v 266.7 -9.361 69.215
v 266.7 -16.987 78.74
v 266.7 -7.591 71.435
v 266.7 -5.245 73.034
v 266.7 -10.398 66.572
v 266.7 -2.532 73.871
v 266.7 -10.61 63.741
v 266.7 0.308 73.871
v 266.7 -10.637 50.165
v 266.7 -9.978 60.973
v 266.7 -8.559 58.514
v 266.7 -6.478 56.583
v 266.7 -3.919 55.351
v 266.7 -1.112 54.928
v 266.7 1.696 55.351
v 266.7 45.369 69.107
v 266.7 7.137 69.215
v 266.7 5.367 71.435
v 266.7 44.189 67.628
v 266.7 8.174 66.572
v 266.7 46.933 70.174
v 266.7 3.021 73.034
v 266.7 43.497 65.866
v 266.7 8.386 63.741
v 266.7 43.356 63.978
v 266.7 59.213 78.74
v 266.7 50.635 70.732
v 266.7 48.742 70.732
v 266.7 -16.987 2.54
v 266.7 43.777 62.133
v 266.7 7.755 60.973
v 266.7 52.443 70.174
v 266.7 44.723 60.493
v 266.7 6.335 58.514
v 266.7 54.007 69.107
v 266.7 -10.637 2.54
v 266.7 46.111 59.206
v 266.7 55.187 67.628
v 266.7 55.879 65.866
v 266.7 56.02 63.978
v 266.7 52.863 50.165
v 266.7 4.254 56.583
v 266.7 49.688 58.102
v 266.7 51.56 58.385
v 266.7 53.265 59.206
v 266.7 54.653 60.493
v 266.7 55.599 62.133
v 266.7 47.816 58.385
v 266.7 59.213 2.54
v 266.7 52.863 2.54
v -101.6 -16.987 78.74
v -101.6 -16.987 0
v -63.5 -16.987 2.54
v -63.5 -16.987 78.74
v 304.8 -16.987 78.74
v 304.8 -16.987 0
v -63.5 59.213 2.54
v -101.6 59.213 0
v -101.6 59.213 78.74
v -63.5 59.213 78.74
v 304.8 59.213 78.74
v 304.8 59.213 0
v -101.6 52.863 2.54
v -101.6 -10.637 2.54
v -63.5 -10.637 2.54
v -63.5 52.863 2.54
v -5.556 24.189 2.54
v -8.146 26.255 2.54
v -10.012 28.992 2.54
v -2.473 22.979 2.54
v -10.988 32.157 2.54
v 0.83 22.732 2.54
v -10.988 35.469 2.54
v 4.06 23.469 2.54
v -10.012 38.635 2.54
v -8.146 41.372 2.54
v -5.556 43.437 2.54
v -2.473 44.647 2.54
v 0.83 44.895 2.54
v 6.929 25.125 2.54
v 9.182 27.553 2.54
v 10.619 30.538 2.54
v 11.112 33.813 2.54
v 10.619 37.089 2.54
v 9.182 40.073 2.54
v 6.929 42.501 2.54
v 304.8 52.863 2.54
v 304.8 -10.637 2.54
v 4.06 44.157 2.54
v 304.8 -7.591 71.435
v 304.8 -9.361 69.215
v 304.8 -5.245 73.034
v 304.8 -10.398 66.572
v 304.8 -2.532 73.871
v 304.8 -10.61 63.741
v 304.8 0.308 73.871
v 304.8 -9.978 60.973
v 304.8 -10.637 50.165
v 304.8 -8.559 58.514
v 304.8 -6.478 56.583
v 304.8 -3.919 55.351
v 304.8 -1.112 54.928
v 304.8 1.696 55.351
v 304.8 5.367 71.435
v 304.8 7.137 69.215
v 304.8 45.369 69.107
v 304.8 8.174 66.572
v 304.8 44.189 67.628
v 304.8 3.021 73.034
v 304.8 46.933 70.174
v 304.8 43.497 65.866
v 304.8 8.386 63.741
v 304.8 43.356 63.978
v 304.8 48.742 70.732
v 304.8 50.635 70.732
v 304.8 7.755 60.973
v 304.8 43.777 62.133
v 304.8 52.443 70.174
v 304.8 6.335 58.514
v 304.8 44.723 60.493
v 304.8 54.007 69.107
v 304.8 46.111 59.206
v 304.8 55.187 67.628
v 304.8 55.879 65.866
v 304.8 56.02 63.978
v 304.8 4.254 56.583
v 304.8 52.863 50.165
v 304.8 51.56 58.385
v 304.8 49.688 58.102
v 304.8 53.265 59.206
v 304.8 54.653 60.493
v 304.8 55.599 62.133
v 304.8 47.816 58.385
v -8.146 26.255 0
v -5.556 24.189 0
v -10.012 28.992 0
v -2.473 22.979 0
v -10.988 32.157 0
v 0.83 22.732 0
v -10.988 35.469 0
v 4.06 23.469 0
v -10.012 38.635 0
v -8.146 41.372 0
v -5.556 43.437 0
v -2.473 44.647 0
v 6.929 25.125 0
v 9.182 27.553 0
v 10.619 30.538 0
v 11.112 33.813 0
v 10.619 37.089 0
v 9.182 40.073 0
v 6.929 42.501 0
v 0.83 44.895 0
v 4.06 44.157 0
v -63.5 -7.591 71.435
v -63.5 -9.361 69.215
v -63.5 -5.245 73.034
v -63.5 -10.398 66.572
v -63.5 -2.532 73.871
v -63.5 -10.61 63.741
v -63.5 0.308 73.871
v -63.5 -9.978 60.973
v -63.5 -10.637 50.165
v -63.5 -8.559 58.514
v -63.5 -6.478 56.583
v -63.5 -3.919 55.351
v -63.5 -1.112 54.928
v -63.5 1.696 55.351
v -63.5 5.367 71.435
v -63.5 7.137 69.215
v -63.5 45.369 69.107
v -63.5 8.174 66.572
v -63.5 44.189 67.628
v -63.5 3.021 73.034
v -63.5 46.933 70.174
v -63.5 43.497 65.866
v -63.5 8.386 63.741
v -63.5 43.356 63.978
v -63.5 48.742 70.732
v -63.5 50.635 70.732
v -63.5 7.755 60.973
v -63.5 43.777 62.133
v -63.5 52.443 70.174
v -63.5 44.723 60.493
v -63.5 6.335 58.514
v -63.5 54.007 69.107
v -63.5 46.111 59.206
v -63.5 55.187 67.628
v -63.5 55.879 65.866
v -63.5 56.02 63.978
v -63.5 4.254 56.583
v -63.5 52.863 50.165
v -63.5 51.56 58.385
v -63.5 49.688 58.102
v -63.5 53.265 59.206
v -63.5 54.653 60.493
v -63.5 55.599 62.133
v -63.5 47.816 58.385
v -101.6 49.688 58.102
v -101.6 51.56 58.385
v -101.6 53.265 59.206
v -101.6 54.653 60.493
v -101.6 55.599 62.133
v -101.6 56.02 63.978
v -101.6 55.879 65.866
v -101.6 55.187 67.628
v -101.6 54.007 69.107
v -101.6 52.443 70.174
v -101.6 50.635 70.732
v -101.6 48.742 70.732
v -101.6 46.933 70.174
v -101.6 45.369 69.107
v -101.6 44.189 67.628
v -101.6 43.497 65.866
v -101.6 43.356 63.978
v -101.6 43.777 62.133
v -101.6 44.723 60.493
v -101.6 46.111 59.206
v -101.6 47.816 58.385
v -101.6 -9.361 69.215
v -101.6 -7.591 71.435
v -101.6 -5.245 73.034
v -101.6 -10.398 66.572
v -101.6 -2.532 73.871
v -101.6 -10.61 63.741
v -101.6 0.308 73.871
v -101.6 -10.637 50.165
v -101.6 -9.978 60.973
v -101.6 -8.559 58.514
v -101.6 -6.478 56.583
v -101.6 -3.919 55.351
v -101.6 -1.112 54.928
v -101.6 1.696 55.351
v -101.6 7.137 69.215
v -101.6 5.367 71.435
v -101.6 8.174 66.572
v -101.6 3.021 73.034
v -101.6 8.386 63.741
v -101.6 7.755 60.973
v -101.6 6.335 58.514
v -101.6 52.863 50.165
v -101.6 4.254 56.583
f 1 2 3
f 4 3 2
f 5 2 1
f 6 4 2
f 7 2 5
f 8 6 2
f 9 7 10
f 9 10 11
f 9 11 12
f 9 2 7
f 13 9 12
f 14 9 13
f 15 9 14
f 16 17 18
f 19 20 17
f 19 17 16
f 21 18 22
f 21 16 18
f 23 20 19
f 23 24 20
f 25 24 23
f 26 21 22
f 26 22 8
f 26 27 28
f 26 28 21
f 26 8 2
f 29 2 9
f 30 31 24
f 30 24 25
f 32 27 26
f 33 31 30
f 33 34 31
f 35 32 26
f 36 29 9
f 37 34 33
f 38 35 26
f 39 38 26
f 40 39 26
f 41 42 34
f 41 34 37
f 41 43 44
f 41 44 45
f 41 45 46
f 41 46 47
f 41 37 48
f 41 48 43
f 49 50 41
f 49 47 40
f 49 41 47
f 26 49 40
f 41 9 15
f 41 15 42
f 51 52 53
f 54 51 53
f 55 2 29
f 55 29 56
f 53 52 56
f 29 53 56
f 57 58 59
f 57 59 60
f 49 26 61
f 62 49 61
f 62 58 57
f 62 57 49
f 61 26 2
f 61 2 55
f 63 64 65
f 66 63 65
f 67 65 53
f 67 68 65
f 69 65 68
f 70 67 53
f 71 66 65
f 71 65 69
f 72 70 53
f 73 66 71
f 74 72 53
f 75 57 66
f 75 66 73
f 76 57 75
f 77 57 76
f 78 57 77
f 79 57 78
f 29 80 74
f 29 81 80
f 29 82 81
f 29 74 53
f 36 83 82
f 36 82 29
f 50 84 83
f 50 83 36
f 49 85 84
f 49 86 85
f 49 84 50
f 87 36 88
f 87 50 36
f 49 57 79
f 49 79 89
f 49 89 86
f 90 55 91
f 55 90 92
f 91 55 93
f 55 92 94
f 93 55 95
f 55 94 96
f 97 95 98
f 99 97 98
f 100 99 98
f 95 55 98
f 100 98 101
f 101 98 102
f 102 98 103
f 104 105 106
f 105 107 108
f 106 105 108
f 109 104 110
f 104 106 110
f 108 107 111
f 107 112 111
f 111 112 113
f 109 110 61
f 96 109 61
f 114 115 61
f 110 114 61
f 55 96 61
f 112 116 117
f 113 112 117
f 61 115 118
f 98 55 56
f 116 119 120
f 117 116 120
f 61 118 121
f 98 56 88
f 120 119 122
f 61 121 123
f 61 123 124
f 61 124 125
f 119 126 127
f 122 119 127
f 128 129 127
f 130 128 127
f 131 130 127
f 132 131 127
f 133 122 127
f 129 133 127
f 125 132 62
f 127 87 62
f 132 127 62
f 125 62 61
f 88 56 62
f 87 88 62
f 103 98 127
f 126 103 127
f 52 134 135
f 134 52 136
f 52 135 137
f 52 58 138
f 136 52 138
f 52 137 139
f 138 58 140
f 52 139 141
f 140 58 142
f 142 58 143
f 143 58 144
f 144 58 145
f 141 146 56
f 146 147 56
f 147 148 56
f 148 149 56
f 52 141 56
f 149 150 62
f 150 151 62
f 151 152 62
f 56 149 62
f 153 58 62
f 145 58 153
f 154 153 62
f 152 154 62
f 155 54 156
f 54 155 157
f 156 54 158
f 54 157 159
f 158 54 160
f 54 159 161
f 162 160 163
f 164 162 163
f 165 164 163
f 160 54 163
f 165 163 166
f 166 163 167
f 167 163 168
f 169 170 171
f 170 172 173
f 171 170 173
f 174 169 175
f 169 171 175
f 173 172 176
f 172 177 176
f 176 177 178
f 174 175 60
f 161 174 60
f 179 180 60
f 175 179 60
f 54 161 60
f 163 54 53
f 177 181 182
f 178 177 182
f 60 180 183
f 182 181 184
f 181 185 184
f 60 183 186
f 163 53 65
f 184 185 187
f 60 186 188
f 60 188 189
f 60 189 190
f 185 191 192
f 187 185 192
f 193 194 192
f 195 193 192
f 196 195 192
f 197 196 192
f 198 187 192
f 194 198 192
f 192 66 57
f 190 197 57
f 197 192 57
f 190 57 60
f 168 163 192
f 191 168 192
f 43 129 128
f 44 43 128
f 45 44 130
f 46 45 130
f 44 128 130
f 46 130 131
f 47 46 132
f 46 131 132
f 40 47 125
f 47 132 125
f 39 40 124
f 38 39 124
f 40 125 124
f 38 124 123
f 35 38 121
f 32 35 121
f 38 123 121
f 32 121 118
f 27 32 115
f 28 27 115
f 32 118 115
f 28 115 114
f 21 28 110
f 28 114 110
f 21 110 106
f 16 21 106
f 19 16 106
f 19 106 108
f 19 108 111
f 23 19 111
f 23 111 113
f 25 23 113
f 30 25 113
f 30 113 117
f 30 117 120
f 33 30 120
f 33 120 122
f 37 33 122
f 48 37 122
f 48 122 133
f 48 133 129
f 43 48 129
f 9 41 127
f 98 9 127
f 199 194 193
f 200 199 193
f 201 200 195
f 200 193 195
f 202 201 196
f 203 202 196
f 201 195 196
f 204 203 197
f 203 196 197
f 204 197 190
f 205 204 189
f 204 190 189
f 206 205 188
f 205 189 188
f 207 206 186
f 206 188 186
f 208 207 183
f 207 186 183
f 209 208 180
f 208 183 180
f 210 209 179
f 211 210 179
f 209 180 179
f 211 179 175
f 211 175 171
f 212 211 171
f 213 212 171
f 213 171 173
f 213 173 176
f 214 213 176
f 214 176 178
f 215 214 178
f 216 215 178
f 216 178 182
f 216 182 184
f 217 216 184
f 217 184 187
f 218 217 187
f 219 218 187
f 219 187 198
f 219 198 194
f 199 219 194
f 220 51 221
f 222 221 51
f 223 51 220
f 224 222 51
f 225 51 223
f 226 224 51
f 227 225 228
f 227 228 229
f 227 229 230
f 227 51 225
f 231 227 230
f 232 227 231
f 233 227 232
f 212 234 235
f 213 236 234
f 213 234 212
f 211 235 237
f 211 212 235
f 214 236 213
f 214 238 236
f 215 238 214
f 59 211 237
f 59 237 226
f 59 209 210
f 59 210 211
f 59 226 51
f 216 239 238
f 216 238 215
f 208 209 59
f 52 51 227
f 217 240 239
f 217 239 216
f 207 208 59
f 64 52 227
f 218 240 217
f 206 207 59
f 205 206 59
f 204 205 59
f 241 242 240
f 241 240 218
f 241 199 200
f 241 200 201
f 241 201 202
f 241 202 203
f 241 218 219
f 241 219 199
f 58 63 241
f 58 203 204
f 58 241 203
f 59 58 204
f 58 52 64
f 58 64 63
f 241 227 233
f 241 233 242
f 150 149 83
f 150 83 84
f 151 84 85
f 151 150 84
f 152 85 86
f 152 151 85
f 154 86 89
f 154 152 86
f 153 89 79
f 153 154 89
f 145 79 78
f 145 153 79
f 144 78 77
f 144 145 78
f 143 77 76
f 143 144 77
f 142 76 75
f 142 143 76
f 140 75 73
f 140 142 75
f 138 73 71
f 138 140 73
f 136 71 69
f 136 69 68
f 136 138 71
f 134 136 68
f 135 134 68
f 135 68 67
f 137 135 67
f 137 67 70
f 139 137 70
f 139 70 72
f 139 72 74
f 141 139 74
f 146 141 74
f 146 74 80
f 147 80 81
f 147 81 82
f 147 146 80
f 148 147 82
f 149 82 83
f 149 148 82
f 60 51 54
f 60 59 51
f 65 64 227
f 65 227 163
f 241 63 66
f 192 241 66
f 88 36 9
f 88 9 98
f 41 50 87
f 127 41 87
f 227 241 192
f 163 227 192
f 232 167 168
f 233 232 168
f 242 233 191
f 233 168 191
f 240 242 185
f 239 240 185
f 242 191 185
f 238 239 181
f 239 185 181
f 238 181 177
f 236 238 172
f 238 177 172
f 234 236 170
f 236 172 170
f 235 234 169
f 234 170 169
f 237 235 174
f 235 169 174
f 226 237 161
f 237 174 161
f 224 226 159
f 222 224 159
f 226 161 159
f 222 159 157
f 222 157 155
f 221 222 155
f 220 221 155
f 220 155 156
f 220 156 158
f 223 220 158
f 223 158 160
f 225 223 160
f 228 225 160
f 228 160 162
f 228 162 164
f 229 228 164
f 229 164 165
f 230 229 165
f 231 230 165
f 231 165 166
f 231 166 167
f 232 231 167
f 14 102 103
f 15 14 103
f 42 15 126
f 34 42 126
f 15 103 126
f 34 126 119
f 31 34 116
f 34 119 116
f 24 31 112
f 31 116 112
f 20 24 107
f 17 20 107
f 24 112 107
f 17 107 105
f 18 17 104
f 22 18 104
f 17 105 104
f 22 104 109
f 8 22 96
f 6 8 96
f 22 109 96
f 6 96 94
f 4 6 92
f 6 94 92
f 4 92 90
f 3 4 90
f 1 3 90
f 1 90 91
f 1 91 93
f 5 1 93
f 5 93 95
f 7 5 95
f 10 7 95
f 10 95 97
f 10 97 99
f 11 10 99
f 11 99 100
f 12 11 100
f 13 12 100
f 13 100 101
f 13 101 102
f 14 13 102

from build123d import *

# Parameters (mm, degrees)
SKETCH1_W           = 609.6
SKETCH1_H           = 76.2
SKETCH1_R           = 11.1125
BOSS_EXTRUDE1_DEPTH = 2.54
SKETCH2_W           = 38.1
SKETCH2_H           = 6.35
BOSS_EXTRUDE2_DEPTH = 76.2
SKETCH3_W           = 38.1
SKETCH3_H           = 76.2
BOSS_EXTRUDE3_DEPTH = 28.575
SKETCH4_R           = 6.35
SKETCH4_R_2         = 9.525
CUT_EXTRUDE1_DEPTH  = 610.6
SKETCH5_W           = 203.2
SKETCH5_H           = 76.2
CUT_EXTRUDE2_DEPTH  = 3.54


with BuildPart() as part:
    # Sketch1 → Boss-Extrude1 (new body)
    with BuildSketch(Plane.XY):
        with Locations((0, 21.113121982)):
            Rectangle(SKETCH1_W, SKETCH1_H)
        with Locations((0, 33.813121982)):
            Circle(SKETCH1_R, mode=Mode.SUBTRACT)
    extrude(amount=BOSS_EXTRUDE1_DEPTH)

    # Sketch2 → Boss-Extrude2 (add)
    with BuildSketch(Plane.XY.offset(2.54)):
        with Locations((-82.55, 56.038121982)):
            Rectangle(SKETCH2_W, SKETCH2_H)
        with Locations((-82.55, -13.811878018)):
            Rectangle(SKETCH2_W, SKETCH2_H)
        with Locations((285.75, 56.038121982)):
            Rectangle(SKETCH2_W, SKETCH2_H)
        with Locations((285.75, -13.811878018)):
            Rectangle(SKETCH2_W, SKETCH2_H)
    extrude(amount=BOSS_EXTRUDE2_DEPTH)

    # Sketch3 → Boss-Extrude3 (add)
    with BuildSketch(Plane.XY.offset(78.74)):
        with Locations((-82.55, 21.113121982)):
            Rectangle(SKETCH3_W, SKETCH3_H)
        with Locations((285.75, 21.113121982)):
            Rectangle(SKETCH3_W, SKETCH3_H)
    extrude(amount=-BOSS_EXTRUDE3_DEPTH)

    # Sketch4 → Cut-Extrude1 (cut, through all)
    with BuildSketch(Plane(origin=(304.8, 0, 0), x_dir=(0, 0, -1), z_dir=(1, 0, 0))):
        with Locations((-64.4525, 49.688121982)):
            Circle(SKETCH4_R)
        with Locations((-64.4525, -1.111878018)):
            Circle(SKETCH4_R_2)
    extrude(amount=-CUT_EXTRUDE1_DEPTH, mode=Mode.SUBTRACT)

    # Sketch5 → Cut-Extrude2 (cut, through all)
    with BuildSketch(Plane.XY.offset(2.54)):
        with Locations((-203.2, 21.113121982)):
            Rectangle(SKETCH5_W, SKETCH5_H)
    extrude(amount=-CUT_EXTRUDE2_DEPTH, mode=Mode.SUBTRACT)


solid = part.part
